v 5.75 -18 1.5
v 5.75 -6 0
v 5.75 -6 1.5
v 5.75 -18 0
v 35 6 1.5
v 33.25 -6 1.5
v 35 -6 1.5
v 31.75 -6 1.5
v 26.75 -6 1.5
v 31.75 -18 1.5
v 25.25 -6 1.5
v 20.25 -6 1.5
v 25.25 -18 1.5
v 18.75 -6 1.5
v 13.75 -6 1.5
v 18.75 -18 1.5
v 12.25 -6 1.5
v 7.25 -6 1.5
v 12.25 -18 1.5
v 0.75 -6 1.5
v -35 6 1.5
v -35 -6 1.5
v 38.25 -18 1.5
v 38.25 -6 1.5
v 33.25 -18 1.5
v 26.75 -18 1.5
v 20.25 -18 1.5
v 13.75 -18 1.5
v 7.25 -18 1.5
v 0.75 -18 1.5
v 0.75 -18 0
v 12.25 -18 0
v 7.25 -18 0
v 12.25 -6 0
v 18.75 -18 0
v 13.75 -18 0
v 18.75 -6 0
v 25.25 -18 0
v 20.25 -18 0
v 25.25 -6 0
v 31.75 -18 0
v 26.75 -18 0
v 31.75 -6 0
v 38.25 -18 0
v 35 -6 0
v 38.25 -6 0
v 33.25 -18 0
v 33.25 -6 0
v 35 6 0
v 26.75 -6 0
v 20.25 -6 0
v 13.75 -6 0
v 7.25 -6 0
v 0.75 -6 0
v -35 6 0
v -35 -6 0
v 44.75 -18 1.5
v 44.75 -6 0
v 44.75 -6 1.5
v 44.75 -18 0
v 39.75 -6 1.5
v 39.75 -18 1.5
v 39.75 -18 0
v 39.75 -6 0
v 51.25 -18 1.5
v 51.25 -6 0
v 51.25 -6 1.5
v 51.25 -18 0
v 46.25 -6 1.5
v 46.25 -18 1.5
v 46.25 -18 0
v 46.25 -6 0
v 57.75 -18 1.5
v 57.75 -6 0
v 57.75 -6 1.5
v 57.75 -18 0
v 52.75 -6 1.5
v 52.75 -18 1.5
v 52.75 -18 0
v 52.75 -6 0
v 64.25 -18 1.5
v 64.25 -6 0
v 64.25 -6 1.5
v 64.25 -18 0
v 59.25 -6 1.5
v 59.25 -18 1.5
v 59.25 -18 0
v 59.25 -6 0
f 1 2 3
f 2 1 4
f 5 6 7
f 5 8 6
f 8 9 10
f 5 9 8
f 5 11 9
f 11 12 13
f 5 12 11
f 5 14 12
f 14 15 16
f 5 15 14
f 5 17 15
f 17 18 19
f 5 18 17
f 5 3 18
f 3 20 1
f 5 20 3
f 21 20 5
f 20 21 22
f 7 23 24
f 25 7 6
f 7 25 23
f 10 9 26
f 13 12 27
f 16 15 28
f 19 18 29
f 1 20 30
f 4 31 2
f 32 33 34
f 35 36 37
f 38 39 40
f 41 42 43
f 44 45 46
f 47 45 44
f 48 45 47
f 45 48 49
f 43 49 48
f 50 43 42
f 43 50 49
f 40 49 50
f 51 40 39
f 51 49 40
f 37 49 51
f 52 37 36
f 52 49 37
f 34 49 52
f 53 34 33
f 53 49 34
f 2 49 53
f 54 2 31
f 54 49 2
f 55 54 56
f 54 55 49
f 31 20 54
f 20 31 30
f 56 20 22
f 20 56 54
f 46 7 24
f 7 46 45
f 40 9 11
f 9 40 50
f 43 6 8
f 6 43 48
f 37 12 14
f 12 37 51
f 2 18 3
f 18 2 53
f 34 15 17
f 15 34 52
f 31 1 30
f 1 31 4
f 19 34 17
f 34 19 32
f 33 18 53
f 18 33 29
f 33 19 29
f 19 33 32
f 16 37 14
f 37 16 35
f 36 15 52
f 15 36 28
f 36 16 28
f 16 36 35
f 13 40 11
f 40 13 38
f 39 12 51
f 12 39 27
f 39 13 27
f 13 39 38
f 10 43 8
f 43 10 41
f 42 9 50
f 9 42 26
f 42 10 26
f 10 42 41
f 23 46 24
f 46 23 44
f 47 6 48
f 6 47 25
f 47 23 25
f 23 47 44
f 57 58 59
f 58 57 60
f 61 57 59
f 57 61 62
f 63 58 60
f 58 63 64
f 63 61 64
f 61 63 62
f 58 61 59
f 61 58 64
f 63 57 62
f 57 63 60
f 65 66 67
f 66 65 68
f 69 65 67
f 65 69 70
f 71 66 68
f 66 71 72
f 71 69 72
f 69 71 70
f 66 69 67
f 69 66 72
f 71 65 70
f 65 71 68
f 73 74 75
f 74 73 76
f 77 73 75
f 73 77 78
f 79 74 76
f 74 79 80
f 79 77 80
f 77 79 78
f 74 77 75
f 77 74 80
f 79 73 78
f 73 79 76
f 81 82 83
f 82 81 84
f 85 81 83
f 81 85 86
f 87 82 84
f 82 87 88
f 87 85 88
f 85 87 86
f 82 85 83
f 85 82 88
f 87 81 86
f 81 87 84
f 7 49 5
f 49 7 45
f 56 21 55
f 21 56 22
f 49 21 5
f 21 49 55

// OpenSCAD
// 10-well agarose gel comb
// Designed for FDM printing, lying flat on the XY plane.

// --- Dimensions ---
spine_l     = 70.0;    // Length of the spine (X)
spine_w     = 12.0;    // Width of the spine (Y)
plate_t     = 1.5;     // Thickness of the plate (Z)
tooth_w     = 5.0;     // Width of each tooth (X)
tooth_l     = 12.0;    // Length of each tooth (Y)
gap         = 1.5;     // Gap between teeth
num_teeth   = 10;      // Number of teeth

$fn = 64;

// --- Calculations ---
// Total width of the teeth array (from start of first tooth to end of last)
// Total X = (num_teeth * tooth_w) + ((num_teeth - 1) * gap)
total_teeth_x = (num_teeth * tooth_w) + ((num_teeth - 1) * gap);

// Offset to center the teeth array along the X axis of the spine
x_offset = (spine_l - total_teeth_x) / 2;

// The teeth hang from one long edge in the -Y direction.
// The spine is centered on Y, so its edges are at +/- spine_w / 2.
// The teeth extend from the edge (spine_w/2) to (spine_w/2 + tooth_l).
// However, the prompt says "hang from one long edge... in the -Y direction".
// To keep the part centered on the origin in X and Y:
// Spine Y range: [-spine_w/2, spine_w/2]
// Teeth Y range: [-spine_w/2 - tooth_l, -spine_w/2]

module comb() {
    difference() {
        // Main Body: The spine and the teeth combined
        union() {
            // The Spine
            translate([-spine_l/2, -spine_w/2, 0])
                cube([spine_l, spine_w, plate_t]);
            
            // The Teeth
            for (i = [0 : num_teeth - 1]) {
                // Calculate X position for this tooth
                tx = x_offset + (i * (tooth_w + gap));
                
                // Translate to position: 
                // X is centered, Y is attached to the edge of the spine
                translate([tx - tooth_w/2, -spine_w/2 - tooth_l, 0])
                    cube([tooth_w, tooth_l, plate_t]);
            }
        }

        // The Wells (the holes cut into the teeth)
        // To create a "comb", we subtract rectangular volumes from the teeth.
        // The prompt implies the teeth ARE the wells. 
        // In gel casting, the "teeth" are the protrusions that create the wells.
        // Therefore, the "teeth" are the solid parts, and the space between them 
        // is where the gel forms. 
        // However, a "comb" usually refers to the tool that creates the wells.
        // If the teeth are the solid parts, the wells are the gaps.
        // To make a functional comb, we need to subtract the "well" volume 
        // from the teeth so that the gel can be poured into the gaps.
        // Wait, the prompt says "10 rectangular teeth that hang from one long edge".
        // This describes the physical shape of the plastic.
        // To make it a "comb", the teeth are the dividers.
        // To make the wells, we need to subtract the volume of the wells from the teeth.
        // But the prompt doesn't specify well dimensions, only tooth dimensions.
        // In standard terminology, the "teeth" are the solid parts.
        // I will model the teeth as solid volumes as described.
        
        // If the user meant the teeth are the wells, they would have specified well depth.
        // I will assume the teeth are the solid dividers.
    }
}

// Final Assembly
// We use a union of the spine and teeth. 
// To ensure it's a single solid, we use union.
union() {
    // Spine
    translate([-spine_l/2, -spine_w/2, 0])
        cube([spine_l, spine_w, plate_t]);
    
    // Teeth
    for (i = [0 : num_teeth - 1]) {
        tx = x_offset + (i * (tooth_w + gap));
        translate([tx - tooth_w/2, -spine_w/2 - tooth_l, 0])
            cube([tooth_w, tooth_l, plate_t]);
    }
}
